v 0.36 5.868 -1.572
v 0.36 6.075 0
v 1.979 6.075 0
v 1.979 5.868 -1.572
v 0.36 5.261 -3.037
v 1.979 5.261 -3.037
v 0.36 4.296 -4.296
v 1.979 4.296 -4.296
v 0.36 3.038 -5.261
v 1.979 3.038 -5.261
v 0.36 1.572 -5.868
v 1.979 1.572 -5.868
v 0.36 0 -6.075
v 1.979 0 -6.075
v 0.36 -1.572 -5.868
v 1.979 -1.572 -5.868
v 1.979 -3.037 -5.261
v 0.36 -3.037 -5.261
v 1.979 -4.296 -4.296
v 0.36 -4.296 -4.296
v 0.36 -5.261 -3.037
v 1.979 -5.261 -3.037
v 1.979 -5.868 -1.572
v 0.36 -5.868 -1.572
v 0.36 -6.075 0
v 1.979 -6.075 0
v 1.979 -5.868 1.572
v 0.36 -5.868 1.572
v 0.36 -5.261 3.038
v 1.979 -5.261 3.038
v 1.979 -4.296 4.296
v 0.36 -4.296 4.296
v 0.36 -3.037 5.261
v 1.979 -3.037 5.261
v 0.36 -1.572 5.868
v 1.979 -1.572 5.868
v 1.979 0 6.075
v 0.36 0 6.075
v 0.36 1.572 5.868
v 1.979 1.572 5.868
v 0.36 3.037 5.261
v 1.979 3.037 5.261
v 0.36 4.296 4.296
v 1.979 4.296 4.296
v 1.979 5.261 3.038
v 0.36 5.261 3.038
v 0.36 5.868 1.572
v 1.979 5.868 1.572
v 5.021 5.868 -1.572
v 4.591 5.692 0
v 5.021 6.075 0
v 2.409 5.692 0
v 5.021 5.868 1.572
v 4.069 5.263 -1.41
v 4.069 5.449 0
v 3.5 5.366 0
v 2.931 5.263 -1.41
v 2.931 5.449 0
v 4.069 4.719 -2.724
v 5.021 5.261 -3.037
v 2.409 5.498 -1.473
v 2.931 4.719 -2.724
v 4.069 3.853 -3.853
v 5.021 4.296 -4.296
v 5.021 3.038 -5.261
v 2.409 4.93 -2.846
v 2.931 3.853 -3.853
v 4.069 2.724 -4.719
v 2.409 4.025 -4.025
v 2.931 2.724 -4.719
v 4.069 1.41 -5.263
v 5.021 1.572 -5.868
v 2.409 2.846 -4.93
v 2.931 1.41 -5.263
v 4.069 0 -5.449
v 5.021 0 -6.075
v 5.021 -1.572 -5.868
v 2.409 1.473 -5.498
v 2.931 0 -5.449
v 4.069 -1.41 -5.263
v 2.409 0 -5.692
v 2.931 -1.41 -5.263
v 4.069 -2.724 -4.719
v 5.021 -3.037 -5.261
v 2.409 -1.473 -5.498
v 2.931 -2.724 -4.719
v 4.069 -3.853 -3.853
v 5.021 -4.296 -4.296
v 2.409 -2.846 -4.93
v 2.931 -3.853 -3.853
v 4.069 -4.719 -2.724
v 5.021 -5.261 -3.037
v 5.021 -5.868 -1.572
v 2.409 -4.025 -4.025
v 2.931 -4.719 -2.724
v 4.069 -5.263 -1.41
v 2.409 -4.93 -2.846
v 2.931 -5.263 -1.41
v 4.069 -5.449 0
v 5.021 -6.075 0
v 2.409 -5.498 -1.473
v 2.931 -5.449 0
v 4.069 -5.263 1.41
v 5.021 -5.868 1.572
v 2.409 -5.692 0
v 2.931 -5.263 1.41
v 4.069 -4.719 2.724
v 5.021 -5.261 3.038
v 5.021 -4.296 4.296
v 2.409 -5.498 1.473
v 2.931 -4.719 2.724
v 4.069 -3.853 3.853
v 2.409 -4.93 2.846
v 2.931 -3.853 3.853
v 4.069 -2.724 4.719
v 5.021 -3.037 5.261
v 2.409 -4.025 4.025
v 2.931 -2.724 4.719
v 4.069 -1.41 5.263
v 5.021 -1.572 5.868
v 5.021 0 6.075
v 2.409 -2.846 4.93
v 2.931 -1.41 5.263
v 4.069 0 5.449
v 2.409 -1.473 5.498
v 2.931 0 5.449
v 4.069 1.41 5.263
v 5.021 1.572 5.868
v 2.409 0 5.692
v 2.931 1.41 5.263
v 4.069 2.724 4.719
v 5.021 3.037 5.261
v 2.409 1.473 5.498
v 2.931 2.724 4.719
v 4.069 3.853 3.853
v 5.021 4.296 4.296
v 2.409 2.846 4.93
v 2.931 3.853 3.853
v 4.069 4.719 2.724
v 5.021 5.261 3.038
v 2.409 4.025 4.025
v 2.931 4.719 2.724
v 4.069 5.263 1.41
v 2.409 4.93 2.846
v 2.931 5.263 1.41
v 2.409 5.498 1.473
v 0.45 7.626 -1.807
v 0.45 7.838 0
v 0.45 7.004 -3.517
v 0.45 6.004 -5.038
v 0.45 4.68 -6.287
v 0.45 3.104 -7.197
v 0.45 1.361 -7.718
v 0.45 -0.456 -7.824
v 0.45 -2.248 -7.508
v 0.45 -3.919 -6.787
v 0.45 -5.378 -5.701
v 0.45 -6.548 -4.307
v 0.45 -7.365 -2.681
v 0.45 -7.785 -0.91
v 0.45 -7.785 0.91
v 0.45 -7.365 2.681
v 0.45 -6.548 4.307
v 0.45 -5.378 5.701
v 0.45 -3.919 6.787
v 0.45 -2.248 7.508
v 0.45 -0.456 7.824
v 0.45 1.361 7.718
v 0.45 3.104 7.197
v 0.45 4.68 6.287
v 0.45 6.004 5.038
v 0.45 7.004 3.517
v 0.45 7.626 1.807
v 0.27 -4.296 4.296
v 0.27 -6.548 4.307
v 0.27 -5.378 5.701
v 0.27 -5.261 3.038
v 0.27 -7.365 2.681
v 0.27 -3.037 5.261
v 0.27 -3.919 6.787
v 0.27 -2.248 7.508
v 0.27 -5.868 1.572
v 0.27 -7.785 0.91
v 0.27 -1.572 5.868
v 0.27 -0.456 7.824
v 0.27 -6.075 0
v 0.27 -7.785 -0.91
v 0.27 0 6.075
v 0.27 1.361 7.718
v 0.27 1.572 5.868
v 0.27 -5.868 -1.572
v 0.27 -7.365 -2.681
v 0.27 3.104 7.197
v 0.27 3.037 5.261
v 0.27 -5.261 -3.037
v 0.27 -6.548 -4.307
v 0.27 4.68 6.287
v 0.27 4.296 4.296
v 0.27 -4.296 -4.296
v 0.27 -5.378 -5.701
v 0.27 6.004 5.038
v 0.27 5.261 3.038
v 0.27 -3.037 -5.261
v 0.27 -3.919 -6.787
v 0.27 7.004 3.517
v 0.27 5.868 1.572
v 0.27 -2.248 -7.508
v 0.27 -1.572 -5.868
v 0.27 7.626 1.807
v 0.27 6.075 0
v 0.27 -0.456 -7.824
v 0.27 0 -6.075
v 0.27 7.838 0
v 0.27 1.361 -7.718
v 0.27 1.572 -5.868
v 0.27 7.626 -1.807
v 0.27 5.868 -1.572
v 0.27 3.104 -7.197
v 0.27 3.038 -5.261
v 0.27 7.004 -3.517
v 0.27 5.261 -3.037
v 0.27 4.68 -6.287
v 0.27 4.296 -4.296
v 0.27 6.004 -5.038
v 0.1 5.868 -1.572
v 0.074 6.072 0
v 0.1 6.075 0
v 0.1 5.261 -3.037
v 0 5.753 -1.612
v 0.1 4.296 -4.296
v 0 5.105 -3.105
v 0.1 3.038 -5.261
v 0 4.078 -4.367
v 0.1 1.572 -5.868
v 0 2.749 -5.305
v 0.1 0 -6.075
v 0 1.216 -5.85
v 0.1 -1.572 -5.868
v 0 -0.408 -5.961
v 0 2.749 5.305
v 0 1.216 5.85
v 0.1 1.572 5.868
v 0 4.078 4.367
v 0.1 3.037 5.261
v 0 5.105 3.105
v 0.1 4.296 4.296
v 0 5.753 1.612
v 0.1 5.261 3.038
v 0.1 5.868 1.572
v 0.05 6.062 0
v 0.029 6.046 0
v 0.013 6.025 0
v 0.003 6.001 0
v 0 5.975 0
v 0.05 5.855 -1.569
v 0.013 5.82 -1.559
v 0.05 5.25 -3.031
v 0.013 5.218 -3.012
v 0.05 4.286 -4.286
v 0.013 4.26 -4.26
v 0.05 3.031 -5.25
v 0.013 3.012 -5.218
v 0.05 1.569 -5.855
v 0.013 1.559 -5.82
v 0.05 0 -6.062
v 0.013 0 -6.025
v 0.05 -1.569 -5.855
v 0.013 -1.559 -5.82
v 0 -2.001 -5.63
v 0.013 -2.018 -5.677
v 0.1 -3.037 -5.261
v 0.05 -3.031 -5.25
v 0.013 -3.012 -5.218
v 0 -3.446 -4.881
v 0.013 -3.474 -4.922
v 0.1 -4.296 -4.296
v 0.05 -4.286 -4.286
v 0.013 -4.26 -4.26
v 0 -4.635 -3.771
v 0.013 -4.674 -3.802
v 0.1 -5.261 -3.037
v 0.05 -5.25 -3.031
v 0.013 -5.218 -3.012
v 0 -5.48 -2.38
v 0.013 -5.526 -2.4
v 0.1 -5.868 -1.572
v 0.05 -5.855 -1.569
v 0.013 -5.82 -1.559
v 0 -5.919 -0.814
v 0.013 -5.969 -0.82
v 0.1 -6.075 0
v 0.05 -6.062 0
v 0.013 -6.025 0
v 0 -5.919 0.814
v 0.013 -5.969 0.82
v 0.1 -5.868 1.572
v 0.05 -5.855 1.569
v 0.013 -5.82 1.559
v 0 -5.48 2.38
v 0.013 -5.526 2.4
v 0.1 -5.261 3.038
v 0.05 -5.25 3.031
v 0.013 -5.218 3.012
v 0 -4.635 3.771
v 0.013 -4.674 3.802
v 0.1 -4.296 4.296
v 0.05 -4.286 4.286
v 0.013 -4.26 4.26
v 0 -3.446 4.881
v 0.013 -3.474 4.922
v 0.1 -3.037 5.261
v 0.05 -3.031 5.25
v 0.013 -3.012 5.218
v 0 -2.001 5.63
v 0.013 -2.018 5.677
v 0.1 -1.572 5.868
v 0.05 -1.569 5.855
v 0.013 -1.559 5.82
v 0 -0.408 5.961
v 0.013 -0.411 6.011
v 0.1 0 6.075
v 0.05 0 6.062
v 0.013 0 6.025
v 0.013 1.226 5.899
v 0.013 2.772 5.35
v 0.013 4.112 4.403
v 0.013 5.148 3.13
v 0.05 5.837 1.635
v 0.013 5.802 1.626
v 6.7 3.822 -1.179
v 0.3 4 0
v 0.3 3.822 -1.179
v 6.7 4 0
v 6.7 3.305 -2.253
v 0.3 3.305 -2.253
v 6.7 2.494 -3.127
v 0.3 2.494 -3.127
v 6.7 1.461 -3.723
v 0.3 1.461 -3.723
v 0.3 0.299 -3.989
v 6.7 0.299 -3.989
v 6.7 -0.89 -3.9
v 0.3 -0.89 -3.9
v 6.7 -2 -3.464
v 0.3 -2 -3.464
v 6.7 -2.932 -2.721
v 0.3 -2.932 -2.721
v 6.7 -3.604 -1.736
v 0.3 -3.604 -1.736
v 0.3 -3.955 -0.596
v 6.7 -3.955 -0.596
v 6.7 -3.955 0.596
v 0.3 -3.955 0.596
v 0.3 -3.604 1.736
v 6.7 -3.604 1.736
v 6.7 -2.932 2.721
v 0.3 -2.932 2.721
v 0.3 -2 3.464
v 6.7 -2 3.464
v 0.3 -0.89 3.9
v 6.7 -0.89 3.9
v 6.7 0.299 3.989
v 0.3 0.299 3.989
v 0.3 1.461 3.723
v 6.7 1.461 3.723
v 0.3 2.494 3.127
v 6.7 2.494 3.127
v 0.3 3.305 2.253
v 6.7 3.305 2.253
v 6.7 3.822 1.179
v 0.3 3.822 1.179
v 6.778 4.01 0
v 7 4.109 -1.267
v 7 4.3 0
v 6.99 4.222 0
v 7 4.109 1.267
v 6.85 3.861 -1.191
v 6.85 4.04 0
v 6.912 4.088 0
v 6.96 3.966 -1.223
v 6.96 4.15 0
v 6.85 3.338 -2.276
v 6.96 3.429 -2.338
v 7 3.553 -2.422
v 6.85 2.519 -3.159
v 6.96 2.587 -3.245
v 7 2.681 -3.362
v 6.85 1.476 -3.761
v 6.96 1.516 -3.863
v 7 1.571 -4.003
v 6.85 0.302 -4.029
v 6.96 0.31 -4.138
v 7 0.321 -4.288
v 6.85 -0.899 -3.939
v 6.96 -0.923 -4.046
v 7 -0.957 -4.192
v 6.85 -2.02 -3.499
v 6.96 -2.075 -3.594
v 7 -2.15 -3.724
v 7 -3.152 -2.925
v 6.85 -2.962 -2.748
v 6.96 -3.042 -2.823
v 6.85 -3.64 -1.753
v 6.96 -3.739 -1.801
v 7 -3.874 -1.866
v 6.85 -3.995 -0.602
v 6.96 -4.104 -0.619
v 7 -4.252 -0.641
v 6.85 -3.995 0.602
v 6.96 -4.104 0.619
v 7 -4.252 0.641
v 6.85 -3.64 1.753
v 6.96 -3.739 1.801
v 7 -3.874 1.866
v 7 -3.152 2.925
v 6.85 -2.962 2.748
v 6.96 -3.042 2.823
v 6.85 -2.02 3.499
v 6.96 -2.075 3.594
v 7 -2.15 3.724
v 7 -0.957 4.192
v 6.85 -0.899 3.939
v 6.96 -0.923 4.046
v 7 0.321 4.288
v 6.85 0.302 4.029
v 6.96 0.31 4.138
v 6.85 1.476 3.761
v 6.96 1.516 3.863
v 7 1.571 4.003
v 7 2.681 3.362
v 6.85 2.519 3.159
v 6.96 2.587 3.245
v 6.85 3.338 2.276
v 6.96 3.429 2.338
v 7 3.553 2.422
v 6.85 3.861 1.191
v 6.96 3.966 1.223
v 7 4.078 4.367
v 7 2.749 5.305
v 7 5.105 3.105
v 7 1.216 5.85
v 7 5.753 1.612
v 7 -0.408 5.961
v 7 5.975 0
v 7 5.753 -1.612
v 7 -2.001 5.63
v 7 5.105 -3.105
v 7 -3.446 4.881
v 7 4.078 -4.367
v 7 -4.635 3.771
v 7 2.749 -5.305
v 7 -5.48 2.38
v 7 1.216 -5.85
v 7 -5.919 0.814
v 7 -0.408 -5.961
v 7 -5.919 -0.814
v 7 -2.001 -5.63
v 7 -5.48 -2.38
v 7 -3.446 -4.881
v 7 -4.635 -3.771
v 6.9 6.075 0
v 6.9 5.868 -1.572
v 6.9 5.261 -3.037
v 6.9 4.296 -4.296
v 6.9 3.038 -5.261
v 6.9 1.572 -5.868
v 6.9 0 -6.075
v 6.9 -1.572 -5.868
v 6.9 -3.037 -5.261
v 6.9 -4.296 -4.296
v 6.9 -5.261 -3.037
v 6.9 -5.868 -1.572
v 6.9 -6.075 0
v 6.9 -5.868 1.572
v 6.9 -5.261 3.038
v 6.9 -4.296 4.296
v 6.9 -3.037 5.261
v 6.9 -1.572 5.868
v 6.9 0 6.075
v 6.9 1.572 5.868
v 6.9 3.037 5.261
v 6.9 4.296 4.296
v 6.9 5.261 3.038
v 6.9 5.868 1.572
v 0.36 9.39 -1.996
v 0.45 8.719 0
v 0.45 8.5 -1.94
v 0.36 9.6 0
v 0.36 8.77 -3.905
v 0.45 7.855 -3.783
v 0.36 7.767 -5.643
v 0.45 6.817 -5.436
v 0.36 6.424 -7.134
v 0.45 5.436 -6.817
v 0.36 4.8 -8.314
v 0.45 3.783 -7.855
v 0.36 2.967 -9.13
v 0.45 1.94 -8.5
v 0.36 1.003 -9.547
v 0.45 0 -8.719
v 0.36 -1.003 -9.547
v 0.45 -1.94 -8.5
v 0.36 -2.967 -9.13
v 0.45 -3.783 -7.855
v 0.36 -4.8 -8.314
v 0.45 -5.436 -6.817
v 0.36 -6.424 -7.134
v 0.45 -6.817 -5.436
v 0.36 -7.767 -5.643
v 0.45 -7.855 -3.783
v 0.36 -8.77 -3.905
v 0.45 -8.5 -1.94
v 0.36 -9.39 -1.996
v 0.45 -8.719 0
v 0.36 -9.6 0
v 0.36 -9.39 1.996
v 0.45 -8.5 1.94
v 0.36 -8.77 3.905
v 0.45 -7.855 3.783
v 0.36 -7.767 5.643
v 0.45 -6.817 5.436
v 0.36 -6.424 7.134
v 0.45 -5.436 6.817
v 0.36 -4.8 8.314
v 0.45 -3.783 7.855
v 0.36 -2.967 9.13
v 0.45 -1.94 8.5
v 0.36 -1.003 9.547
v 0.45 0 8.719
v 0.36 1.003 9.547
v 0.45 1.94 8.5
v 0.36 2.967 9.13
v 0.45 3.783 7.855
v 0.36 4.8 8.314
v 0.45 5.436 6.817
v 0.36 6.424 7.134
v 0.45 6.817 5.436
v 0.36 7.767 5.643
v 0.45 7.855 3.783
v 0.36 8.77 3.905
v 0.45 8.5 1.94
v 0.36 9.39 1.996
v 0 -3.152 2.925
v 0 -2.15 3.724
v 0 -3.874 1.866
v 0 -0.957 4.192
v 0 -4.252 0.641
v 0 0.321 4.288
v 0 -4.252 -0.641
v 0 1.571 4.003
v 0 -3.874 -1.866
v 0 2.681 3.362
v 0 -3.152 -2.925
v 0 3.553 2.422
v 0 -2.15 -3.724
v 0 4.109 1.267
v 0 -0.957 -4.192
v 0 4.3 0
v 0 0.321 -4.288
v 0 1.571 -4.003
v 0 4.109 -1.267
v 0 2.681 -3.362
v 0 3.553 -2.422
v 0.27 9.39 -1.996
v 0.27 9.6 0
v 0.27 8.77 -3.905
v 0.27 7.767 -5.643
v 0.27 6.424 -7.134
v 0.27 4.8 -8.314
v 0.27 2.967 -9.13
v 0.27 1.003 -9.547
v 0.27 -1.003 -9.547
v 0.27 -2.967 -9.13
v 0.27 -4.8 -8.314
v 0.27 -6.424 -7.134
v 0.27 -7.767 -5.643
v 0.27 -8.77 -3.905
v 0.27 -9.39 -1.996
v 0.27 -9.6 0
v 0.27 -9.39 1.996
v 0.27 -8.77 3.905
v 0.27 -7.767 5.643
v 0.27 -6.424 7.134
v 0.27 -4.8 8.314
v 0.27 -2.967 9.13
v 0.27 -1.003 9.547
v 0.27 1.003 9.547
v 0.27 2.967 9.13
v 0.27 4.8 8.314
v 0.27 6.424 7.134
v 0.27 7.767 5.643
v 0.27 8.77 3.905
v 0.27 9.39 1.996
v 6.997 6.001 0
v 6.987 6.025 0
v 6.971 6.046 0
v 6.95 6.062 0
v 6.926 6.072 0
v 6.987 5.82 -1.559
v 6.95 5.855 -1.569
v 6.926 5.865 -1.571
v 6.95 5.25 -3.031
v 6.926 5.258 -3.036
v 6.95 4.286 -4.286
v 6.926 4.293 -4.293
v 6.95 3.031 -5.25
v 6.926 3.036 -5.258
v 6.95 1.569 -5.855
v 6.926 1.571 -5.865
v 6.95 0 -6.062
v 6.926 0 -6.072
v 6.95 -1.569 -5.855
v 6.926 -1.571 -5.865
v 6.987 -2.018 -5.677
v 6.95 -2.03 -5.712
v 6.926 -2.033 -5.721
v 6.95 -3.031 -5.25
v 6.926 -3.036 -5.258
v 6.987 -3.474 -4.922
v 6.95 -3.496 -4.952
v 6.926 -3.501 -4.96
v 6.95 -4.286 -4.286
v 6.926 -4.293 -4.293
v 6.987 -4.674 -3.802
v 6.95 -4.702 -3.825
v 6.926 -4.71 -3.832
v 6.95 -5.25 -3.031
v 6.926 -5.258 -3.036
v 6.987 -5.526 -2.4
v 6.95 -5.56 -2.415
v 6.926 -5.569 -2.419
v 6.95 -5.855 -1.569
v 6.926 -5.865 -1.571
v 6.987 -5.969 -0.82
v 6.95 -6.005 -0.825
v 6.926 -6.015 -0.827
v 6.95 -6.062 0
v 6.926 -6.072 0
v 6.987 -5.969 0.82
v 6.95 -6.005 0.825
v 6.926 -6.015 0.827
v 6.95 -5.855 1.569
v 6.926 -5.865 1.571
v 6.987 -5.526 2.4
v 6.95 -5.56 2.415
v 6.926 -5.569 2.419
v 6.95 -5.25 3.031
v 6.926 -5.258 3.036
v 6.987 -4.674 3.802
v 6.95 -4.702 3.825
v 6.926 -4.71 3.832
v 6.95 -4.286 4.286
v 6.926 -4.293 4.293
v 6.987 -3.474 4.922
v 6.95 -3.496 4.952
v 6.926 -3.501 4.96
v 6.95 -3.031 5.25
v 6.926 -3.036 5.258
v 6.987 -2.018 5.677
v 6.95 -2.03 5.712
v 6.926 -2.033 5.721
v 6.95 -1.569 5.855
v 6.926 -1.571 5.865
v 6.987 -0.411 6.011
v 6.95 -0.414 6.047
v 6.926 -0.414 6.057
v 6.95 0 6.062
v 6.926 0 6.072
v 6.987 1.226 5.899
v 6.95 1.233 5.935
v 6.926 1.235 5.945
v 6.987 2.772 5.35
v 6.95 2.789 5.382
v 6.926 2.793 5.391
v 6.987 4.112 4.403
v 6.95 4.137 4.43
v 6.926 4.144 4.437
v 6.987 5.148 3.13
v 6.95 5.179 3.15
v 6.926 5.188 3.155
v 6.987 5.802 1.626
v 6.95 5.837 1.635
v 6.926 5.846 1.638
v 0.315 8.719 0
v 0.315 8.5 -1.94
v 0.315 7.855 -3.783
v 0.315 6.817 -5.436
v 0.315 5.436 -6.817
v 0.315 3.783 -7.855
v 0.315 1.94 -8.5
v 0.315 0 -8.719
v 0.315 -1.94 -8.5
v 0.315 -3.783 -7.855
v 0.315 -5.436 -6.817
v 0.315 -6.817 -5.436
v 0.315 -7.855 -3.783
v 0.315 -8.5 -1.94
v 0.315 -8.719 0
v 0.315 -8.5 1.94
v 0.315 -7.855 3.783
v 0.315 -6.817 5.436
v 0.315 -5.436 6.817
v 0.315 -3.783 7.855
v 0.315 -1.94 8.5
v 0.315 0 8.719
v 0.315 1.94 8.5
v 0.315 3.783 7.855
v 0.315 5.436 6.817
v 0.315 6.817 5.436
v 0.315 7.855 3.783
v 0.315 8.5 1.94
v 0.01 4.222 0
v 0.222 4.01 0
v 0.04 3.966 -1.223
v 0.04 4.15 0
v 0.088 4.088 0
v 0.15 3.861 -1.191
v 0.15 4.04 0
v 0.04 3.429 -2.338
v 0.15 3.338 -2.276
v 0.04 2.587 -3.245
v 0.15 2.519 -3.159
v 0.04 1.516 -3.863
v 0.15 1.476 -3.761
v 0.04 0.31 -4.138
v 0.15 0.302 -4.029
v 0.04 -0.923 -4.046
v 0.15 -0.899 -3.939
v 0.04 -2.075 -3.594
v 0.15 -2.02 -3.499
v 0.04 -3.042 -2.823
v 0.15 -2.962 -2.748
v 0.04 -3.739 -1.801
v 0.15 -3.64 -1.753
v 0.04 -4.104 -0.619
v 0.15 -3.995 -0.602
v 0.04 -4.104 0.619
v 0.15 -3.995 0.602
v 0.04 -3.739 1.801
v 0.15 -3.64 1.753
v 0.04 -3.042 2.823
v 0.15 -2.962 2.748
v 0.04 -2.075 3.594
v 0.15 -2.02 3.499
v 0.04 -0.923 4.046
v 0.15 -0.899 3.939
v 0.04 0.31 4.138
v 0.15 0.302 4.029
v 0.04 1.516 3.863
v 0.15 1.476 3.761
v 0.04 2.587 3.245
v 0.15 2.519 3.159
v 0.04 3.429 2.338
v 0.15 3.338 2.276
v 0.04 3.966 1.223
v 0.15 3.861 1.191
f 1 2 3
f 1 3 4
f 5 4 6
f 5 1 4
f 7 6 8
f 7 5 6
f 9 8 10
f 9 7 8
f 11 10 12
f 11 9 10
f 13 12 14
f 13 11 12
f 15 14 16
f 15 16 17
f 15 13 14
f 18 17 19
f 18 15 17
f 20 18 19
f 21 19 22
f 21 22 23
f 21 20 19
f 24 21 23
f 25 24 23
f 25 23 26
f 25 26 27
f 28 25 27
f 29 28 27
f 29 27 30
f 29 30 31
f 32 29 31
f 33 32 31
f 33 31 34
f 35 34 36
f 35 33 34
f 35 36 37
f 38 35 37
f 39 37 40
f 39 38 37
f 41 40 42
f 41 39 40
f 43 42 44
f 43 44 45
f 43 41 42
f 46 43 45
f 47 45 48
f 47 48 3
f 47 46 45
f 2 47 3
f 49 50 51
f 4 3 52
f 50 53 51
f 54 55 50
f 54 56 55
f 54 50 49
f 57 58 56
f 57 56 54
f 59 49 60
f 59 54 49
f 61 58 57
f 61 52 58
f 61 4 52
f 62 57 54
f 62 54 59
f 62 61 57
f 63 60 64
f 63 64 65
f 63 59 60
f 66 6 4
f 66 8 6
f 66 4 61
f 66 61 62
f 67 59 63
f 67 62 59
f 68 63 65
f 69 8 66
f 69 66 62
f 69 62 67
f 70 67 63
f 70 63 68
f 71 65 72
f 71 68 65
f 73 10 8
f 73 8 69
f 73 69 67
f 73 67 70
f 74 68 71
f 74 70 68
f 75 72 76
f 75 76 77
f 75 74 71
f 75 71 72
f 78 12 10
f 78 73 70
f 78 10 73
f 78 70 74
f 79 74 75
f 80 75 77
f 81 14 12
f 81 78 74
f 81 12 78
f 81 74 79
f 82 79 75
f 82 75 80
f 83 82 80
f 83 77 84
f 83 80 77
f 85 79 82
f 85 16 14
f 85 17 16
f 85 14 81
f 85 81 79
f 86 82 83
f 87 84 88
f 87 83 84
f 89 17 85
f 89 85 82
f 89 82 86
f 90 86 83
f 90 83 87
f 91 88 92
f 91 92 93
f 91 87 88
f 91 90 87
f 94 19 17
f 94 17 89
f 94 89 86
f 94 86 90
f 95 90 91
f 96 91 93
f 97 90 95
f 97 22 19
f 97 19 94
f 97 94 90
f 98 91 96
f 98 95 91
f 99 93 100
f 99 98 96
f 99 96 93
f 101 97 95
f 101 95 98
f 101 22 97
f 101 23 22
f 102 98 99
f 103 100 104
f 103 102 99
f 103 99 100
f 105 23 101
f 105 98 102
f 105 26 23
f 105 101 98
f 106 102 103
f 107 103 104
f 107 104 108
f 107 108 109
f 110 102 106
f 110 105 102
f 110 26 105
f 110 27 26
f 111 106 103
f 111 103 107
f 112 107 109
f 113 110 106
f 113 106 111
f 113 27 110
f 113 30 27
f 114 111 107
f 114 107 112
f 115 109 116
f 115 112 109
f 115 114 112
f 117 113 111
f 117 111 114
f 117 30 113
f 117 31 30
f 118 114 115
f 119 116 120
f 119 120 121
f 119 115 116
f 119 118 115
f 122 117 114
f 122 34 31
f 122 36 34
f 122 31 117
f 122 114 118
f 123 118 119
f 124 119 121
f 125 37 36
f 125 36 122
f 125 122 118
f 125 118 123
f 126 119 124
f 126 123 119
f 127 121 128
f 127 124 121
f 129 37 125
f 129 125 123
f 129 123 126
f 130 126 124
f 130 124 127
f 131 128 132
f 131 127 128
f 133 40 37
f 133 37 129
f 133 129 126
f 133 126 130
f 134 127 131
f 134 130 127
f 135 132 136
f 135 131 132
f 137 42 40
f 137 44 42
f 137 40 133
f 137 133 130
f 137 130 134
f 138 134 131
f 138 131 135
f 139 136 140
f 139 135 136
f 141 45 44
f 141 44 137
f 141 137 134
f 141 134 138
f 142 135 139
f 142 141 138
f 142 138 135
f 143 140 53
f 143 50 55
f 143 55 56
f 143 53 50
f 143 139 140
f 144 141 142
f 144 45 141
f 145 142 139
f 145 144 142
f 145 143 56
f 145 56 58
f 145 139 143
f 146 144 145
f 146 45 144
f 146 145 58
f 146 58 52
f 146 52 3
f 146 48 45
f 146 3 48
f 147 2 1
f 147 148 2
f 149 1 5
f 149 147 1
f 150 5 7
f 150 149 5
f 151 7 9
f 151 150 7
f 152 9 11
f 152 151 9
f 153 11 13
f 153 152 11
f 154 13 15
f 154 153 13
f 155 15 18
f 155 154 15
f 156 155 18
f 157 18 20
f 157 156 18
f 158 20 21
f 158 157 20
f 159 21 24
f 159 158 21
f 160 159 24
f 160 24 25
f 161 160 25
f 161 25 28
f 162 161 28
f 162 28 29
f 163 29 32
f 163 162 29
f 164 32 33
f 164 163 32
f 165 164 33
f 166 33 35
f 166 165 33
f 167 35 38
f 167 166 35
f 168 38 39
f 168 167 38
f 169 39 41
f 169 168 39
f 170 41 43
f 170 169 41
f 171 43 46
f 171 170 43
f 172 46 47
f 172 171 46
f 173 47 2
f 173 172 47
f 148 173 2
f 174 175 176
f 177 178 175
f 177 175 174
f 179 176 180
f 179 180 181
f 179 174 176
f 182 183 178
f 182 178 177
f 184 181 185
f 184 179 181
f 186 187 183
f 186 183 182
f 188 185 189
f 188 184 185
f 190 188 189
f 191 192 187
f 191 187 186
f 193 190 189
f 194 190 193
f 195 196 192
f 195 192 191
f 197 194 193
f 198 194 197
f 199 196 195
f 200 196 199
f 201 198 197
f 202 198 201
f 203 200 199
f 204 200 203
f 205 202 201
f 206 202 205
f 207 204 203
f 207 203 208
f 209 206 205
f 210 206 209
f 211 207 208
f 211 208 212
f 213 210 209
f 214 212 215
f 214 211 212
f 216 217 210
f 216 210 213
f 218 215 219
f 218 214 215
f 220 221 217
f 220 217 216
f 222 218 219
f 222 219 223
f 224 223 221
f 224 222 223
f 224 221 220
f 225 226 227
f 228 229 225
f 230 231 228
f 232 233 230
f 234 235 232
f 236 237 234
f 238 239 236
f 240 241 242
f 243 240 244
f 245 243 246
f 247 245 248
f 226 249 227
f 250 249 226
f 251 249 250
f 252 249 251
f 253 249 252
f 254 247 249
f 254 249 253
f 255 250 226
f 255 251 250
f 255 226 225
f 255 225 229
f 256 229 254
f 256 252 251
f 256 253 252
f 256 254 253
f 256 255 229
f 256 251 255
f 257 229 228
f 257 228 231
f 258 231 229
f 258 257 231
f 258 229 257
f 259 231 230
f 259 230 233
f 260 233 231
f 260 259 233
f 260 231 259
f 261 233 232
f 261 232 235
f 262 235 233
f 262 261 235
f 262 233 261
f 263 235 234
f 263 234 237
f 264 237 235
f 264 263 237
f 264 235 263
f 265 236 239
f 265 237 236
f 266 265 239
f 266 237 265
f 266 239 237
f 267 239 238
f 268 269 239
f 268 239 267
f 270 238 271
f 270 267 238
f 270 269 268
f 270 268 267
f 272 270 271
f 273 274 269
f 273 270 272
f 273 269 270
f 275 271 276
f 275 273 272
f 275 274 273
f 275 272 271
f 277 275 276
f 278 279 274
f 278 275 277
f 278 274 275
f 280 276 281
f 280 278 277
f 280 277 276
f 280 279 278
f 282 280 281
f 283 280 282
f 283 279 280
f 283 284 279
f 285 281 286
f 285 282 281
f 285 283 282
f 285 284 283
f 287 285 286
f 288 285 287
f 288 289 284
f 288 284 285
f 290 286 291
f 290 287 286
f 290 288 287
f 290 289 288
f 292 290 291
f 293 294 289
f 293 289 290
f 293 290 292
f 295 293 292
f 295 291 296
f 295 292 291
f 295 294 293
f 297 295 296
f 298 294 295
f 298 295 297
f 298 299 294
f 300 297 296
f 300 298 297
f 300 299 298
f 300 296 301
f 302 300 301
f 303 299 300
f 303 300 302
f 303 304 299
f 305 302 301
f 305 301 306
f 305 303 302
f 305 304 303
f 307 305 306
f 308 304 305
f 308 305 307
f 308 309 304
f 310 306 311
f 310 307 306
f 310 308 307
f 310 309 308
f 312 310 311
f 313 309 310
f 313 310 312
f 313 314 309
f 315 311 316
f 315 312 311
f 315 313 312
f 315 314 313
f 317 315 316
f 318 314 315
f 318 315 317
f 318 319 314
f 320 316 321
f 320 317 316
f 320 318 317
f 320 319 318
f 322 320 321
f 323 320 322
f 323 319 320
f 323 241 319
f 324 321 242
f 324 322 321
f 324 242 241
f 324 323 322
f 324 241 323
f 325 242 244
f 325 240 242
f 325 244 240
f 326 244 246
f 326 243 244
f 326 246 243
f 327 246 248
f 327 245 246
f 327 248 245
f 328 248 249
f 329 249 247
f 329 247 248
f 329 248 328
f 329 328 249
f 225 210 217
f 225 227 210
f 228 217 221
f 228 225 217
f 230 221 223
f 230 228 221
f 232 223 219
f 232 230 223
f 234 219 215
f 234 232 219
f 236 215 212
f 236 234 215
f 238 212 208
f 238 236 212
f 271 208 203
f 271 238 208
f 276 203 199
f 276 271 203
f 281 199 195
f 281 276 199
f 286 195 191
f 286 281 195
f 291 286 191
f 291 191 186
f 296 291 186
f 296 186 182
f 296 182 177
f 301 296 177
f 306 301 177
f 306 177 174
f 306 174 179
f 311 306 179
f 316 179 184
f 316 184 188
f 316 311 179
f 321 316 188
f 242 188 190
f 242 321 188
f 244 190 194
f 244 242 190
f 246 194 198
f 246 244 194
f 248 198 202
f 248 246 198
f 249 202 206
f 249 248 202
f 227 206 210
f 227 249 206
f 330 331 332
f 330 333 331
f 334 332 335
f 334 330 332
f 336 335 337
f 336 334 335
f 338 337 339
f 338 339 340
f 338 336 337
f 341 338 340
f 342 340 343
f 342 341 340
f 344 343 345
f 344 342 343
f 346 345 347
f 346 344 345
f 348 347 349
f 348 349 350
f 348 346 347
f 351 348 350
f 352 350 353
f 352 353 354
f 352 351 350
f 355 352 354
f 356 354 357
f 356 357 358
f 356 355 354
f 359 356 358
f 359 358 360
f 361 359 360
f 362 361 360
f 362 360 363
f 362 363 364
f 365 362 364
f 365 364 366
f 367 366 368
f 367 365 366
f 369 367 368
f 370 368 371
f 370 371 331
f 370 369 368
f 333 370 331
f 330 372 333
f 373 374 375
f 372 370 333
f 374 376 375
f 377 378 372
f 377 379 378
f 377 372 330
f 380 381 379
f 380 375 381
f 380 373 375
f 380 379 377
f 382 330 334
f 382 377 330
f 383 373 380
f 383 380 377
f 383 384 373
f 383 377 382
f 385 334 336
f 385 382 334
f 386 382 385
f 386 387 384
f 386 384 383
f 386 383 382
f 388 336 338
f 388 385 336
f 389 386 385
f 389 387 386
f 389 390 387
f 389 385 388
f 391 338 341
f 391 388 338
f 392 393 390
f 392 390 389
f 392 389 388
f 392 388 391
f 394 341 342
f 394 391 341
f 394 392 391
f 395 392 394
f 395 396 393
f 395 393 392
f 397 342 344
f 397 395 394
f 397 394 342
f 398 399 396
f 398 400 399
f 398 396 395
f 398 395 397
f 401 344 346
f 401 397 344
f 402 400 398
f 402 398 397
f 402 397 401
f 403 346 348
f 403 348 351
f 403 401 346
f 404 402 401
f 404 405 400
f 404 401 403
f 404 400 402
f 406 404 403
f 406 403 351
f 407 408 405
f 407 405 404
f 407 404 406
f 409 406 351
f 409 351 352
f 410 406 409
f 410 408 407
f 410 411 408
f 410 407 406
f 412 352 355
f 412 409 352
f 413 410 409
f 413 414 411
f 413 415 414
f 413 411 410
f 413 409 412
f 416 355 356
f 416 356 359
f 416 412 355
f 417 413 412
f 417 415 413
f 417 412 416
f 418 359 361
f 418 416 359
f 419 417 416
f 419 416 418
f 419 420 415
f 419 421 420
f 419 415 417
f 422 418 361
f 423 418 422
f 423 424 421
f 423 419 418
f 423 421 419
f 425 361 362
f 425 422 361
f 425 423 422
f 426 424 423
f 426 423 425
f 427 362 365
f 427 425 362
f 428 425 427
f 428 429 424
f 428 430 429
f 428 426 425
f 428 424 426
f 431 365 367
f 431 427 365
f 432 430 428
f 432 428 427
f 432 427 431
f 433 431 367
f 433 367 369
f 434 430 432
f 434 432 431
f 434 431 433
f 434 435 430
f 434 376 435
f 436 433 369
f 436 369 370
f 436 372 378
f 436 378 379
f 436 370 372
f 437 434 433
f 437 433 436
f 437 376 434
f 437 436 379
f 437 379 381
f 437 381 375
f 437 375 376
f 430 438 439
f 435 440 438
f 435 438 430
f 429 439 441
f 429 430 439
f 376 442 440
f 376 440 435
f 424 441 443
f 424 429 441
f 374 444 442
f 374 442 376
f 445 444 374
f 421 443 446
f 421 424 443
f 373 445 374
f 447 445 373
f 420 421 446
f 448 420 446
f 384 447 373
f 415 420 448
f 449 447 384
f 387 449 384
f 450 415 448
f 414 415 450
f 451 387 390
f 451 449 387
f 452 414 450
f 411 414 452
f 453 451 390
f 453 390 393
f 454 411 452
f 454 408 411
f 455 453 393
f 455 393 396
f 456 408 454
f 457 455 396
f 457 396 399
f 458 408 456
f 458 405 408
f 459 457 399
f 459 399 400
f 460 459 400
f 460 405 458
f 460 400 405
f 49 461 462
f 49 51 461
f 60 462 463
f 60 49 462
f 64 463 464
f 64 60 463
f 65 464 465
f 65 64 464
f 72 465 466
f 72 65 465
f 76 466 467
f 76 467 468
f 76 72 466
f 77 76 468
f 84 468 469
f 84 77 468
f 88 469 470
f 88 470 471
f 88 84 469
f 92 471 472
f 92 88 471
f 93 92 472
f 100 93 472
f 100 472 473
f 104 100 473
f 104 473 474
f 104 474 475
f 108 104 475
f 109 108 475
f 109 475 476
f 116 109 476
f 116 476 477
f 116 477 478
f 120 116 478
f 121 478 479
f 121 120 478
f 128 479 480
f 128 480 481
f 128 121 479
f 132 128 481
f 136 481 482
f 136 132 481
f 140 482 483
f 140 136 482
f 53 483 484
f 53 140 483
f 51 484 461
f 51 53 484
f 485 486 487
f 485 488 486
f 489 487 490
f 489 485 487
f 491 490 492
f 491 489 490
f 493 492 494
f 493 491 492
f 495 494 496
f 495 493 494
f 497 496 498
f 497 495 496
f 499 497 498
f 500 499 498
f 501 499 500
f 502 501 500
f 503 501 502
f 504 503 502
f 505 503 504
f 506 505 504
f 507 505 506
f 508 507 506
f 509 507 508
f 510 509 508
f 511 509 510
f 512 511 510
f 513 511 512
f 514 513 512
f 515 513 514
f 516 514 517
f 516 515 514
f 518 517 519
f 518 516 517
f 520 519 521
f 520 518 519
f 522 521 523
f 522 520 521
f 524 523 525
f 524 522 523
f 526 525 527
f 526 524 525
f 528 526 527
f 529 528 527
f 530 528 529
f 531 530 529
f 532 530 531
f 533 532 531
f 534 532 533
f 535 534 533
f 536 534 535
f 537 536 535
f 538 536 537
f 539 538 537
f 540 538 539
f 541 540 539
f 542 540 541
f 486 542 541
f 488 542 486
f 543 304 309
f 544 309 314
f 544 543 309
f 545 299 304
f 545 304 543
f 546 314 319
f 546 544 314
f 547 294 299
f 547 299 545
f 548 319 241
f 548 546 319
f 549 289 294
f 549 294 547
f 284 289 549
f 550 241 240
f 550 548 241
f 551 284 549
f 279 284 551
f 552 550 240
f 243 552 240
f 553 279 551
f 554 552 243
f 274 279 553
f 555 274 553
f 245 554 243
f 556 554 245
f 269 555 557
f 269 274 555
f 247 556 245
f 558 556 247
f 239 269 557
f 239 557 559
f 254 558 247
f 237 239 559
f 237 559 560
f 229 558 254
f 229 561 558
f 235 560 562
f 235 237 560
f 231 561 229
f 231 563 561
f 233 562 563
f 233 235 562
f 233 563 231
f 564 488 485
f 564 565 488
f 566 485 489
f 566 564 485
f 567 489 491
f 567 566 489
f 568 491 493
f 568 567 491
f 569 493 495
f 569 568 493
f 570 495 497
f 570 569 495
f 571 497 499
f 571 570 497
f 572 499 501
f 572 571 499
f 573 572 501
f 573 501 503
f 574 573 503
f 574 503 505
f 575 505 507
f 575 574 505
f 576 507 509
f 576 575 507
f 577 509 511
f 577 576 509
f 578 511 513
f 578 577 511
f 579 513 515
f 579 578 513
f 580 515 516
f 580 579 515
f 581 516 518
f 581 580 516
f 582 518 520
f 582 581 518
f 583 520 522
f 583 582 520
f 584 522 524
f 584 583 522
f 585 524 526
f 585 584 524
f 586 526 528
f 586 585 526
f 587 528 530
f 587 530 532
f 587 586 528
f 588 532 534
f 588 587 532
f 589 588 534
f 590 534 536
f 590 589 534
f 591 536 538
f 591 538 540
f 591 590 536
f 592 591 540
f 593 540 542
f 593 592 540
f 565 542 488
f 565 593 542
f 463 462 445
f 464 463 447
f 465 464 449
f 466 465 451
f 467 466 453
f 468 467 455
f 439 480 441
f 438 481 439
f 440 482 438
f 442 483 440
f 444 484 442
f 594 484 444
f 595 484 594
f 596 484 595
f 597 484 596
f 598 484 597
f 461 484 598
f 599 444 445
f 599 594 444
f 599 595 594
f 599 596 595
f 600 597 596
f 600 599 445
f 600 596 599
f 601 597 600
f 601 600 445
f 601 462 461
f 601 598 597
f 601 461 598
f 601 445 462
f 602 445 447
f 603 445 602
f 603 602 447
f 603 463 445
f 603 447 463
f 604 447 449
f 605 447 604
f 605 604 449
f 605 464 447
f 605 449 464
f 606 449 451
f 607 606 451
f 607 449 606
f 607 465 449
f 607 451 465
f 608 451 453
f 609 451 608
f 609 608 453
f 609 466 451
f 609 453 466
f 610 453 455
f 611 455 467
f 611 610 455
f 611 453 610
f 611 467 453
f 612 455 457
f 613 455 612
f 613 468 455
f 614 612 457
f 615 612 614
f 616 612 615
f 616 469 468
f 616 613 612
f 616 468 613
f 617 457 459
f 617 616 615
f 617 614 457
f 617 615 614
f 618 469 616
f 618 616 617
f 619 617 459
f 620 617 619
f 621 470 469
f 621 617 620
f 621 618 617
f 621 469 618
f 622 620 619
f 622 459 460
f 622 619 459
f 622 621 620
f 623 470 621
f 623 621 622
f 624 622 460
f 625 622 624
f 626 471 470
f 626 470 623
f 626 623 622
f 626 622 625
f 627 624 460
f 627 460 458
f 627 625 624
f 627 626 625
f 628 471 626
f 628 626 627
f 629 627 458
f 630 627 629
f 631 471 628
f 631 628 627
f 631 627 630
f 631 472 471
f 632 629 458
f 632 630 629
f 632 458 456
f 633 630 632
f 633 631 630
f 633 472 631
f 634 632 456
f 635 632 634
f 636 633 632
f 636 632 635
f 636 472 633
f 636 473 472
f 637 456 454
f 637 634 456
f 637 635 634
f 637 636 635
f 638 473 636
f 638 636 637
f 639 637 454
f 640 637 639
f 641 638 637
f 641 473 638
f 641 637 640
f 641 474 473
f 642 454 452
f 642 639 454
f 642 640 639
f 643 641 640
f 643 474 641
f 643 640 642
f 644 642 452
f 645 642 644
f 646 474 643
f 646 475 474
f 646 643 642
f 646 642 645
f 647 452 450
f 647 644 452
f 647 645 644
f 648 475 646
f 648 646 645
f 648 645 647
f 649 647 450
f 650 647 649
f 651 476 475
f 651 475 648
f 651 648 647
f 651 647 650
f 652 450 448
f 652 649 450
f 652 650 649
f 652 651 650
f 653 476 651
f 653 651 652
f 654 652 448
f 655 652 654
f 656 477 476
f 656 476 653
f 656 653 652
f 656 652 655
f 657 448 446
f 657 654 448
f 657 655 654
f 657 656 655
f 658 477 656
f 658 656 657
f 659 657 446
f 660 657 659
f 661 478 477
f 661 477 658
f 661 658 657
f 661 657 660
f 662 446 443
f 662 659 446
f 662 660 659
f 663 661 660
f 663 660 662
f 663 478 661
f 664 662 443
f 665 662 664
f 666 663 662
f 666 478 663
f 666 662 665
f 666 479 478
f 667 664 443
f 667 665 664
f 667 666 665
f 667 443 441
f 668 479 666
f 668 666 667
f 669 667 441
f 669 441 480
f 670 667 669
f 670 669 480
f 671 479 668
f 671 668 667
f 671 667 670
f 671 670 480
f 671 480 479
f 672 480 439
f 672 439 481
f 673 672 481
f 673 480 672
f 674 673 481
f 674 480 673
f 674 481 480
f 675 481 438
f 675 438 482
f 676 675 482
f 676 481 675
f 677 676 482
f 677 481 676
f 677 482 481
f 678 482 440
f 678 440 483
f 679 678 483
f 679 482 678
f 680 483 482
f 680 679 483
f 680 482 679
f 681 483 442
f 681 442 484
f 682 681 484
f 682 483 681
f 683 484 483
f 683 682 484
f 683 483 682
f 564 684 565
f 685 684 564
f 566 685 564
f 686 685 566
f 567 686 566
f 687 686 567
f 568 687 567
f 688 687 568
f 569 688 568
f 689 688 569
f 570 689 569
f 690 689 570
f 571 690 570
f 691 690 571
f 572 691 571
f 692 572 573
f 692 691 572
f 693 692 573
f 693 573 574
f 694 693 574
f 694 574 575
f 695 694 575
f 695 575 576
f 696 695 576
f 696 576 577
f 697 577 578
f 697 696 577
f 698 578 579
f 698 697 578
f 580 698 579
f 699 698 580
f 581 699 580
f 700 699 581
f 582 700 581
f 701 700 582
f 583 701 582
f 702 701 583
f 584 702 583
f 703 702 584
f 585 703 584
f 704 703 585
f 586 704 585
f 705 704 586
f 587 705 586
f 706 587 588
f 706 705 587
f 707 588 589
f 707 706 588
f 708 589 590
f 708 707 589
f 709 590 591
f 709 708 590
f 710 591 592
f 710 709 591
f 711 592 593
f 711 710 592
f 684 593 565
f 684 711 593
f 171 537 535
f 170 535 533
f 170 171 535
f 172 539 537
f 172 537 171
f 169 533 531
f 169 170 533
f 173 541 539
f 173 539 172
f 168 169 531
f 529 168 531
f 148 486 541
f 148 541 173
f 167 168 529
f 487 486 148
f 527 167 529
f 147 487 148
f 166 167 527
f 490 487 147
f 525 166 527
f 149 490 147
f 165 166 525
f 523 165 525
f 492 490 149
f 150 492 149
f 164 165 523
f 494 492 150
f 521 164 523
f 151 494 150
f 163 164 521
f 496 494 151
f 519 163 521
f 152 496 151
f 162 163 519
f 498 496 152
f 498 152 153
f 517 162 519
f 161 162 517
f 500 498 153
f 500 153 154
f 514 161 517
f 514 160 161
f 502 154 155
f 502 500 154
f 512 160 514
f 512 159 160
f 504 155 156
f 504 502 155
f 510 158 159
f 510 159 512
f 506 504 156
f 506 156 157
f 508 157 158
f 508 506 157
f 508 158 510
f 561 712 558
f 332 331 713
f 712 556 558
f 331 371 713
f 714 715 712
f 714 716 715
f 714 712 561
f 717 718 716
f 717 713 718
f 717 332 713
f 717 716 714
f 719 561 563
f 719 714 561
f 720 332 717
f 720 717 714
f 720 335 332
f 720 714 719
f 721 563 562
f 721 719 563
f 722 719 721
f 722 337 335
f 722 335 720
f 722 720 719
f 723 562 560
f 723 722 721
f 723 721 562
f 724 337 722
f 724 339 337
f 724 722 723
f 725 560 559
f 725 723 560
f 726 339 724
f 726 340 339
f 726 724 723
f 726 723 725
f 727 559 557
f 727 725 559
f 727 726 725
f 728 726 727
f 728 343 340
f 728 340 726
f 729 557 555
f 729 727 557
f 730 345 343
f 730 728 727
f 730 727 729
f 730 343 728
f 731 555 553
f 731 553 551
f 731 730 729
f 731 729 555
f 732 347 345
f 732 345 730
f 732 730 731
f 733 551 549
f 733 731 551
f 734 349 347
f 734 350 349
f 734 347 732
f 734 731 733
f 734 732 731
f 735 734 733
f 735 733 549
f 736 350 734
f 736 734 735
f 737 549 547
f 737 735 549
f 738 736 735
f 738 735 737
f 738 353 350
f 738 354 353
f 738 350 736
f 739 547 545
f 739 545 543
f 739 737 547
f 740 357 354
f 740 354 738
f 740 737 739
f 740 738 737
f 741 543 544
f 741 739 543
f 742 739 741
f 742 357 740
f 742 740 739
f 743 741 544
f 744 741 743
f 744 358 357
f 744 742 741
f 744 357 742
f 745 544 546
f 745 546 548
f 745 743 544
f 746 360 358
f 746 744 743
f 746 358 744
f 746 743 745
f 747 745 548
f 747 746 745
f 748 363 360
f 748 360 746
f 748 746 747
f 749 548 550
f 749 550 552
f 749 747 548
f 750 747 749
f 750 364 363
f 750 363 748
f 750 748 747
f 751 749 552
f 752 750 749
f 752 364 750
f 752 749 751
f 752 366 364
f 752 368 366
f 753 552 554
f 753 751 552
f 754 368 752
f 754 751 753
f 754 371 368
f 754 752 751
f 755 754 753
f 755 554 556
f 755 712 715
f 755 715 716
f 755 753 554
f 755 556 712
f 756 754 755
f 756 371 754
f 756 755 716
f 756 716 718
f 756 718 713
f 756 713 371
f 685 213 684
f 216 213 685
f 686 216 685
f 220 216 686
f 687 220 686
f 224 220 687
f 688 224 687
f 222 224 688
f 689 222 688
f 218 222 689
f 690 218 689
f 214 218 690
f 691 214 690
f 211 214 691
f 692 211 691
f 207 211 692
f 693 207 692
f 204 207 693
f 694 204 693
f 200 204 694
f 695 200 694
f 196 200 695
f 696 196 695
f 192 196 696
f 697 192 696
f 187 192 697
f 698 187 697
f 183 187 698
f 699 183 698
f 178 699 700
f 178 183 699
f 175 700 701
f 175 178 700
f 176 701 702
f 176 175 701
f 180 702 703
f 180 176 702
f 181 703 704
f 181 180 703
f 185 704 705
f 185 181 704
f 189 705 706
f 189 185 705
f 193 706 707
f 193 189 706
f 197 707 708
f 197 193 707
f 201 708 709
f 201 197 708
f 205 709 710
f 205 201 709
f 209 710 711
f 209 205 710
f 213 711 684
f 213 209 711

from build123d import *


with BuildPart() as part:
    # Skizze1 → Rotation1 (revolve)
    with BuildSketch(Plane.XY):
        with BuildLine():
            Line((0, 5.975), (0, 4.3))
            ThreePointArc((0, 4.3), (0.087867966, 4.087867966), (0.3, 4))
            Line((0.3, 4), (6.7, 4))
            ThreePointArc((6.7, 4), (6.912132034, 4.087867966), (7, 4.3))
            Line((7, 4.3), (7, 5.975))
            ThreePointArc((7, 5.975), (6.970710678, 6.045710678), (6.9, 6.075))
            Line((6.9, 6.075), (5.020728526, 6.075))
            ThreePointArc((5.020728526, 6.075), (3.5, 5.3655), (1.979271474, 6.075))
            Line((1.979271474, 6.075), (0.1, 6.075))
            ThreePointArc((0.1, 6.075), (0.029289322, 6.045710678), (0, 5.975))
        make_face()
    revolve(axis=Axis((50, 0, 0), (-1, 0, 0)))

    # Skizze2 → Rotation2 (revolve)
    with BuildSketch(Plane.XY):
        Polygon((0.27, 9.6), (0.315, 8.71875), (0.27, 7.8375), (0.27, 6.075), (0.36, 6.075), (0.45, 7.8375), (0.45, 8.71875), (0.36, 9.6), align=None)
    revolve(axis=Axis((50, 0, 0), (-1, 0, 0)))


solid = part.part
